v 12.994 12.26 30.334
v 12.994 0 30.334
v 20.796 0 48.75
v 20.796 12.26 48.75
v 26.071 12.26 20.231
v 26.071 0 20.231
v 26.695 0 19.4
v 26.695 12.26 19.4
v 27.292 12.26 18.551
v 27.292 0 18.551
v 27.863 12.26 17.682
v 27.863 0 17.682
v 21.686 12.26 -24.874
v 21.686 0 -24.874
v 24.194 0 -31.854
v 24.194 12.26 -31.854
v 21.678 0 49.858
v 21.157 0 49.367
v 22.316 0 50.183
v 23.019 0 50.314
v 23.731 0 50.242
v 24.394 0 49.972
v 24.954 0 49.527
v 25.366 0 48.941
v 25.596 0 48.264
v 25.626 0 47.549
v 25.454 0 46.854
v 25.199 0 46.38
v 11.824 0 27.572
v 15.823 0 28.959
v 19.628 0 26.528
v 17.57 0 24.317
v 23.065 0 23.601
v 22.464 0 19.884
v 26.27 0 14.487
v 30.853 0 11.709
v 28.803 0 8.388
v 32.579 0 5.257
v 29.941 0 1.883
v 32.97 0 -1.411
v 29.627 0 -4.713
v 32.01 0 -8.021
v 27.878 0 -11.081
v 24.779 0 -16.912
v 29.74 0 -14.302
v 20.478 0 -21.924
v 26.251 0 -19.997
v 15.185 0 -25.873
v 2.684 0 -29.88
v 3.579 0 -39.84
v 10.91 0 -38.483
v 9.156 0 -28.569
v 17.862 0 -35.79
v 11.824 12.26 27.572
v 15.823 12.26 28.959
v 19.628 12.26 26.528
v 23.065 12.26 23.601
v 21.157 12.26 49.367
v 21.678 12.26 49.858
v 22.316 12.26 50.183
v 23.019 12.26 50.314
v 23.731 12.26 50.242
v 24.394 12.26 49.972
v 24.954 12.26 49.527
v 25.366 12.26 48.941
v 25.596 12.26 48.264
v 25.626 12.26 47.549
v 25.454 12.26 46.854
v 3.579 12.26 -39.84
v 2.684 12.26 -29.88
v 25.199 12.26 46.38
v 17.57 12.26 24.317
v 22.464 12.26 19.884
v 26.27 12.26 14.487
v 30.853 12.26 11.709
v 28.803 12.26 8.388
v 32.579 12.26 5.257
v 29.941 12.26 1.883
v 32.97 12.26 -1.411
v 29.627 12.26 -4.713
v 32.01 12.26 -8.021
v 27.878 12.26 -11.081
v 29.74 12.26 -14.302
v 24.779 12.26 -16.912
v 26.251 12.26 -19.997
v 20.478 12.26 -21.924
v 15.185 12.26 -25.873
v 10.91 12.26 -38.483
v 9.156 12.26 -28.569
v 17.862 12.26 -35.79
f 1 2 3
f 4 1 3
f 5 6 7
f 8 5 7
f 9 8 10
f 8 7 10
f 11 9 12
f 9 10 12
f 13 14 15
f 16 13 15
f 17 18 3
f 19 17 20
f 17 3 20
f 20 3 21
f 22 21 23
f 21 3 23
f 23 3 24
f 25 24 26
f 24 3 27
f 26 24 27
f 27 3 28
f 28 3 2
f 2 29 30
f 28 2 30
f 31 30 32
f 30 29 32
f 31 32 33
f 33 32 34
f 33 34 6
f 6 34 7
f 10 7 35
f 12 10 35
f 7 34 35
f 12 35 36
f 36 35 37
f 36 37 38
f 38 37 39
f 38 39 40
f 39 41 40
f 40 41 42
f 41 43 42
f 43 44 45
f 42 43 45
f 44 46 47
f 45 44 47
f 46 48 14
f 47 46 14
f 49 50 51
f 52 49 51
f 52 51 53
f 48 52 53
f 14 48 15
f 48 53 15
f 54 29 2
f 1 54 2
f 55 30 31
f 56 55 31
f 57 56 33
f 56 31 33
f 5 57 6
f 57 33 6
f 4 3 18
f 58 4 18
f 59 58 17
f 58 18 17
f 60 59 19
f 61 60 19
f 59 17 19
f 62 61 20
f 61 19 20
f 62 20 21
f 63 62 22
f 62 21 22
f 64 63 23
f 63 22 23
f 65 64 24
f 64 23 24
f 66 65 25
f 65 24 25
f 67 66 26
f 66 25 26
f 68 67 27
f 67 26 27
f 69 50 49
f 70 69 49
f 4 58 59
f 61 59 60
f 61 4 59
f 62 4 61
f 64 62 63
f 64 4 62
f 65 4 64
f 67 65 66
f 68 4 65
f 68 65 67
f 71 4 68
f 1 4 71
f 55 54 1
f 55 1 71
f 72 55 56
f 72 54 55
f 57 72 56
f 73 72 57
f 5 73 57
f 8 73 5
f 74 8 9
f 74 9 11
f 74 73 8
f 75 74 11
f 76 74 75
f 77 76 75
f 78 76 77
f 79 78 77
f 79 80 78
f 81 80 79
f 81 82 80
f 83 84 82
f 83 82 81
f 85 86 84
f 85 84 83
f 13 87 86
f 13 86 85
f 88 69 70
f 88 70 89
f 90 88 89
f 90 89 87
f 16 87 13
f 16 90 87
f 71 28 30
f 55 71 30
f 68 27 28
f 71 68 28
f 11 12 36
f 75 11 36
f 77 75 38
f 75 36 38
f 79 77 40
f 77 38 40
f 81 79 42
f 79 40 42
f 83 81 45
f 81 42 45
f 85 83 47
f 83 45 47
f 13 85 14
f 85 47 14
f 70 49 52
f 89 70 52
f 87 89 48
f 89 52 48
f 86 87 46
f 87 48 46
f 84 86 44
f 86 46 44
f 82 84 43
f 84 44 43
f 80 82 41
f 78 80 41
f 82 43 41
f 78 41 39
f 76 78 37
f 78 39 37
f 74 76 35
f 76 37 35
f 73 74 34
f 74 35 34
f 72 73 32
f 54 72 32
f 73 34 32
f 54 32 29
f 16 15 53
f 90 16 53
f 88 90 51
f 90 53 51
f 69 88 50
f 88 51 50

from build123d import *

# Parameters (mm, degrees)
RESSALTO_EXTRUS_O1_DEPTH = 12.26


with BuildPart() as part:
    # Esboço1 → Ressalto-extrusão1 (new body)
    with BuildSketch(Plane(origin=(0, 0, 0), x_dir=(1, 0, 0), z_dir=(0, 1, 0))):
        with BuildLine():
            ThreePointArc((27.862912529, -17.68214086), (32.657820254, 4.739913109), (21.6864187, 24.873665672))
            Line((21.6864187, 24.873665672), (24.193905015, 31.85365959))
            ThreePointArc((24.193905015, 31.85365959), (14.449004884, 37.299154508), (3.578740021, 39.839594489))
            Line((3.578740021, 39.839594489), (2.684054455, 29.879689618))
            ThreePointArc((2.684054455, 29.879689618), (29.627442083, 4.713244699), (11.823645173, -27.571750304))
            Line((11.823645173, -27.571750304), (12.993920826, -30.334106573))
            Line((12.993920826, -30.334106573), (20.795690346, -48.749654144))
            ThreePointArc((20.795690346, -48.749654144), (24.072464244, -50.130779062), (25.453589161, -46.854005164))
            Line((25.453589161, -46.854005164), (25.198608413, -46.380200094))
            Line((25.198608413, -46.380200094), (15.823293166, -28.958995034))
            ThreePointArc((15.823293166, -28.958995034), (21.396881696, -25.123165678), (26.071005915, -20.231229586))
            ThreePointArc((26.071005915, -20.231229586), (26.997061933, -18.977846216), (27.862912529, -17.68214086))
        make_face()
    extrude(amount=RESSALTO_EXTRUS_O1_DEPTH)


solid = part.part
